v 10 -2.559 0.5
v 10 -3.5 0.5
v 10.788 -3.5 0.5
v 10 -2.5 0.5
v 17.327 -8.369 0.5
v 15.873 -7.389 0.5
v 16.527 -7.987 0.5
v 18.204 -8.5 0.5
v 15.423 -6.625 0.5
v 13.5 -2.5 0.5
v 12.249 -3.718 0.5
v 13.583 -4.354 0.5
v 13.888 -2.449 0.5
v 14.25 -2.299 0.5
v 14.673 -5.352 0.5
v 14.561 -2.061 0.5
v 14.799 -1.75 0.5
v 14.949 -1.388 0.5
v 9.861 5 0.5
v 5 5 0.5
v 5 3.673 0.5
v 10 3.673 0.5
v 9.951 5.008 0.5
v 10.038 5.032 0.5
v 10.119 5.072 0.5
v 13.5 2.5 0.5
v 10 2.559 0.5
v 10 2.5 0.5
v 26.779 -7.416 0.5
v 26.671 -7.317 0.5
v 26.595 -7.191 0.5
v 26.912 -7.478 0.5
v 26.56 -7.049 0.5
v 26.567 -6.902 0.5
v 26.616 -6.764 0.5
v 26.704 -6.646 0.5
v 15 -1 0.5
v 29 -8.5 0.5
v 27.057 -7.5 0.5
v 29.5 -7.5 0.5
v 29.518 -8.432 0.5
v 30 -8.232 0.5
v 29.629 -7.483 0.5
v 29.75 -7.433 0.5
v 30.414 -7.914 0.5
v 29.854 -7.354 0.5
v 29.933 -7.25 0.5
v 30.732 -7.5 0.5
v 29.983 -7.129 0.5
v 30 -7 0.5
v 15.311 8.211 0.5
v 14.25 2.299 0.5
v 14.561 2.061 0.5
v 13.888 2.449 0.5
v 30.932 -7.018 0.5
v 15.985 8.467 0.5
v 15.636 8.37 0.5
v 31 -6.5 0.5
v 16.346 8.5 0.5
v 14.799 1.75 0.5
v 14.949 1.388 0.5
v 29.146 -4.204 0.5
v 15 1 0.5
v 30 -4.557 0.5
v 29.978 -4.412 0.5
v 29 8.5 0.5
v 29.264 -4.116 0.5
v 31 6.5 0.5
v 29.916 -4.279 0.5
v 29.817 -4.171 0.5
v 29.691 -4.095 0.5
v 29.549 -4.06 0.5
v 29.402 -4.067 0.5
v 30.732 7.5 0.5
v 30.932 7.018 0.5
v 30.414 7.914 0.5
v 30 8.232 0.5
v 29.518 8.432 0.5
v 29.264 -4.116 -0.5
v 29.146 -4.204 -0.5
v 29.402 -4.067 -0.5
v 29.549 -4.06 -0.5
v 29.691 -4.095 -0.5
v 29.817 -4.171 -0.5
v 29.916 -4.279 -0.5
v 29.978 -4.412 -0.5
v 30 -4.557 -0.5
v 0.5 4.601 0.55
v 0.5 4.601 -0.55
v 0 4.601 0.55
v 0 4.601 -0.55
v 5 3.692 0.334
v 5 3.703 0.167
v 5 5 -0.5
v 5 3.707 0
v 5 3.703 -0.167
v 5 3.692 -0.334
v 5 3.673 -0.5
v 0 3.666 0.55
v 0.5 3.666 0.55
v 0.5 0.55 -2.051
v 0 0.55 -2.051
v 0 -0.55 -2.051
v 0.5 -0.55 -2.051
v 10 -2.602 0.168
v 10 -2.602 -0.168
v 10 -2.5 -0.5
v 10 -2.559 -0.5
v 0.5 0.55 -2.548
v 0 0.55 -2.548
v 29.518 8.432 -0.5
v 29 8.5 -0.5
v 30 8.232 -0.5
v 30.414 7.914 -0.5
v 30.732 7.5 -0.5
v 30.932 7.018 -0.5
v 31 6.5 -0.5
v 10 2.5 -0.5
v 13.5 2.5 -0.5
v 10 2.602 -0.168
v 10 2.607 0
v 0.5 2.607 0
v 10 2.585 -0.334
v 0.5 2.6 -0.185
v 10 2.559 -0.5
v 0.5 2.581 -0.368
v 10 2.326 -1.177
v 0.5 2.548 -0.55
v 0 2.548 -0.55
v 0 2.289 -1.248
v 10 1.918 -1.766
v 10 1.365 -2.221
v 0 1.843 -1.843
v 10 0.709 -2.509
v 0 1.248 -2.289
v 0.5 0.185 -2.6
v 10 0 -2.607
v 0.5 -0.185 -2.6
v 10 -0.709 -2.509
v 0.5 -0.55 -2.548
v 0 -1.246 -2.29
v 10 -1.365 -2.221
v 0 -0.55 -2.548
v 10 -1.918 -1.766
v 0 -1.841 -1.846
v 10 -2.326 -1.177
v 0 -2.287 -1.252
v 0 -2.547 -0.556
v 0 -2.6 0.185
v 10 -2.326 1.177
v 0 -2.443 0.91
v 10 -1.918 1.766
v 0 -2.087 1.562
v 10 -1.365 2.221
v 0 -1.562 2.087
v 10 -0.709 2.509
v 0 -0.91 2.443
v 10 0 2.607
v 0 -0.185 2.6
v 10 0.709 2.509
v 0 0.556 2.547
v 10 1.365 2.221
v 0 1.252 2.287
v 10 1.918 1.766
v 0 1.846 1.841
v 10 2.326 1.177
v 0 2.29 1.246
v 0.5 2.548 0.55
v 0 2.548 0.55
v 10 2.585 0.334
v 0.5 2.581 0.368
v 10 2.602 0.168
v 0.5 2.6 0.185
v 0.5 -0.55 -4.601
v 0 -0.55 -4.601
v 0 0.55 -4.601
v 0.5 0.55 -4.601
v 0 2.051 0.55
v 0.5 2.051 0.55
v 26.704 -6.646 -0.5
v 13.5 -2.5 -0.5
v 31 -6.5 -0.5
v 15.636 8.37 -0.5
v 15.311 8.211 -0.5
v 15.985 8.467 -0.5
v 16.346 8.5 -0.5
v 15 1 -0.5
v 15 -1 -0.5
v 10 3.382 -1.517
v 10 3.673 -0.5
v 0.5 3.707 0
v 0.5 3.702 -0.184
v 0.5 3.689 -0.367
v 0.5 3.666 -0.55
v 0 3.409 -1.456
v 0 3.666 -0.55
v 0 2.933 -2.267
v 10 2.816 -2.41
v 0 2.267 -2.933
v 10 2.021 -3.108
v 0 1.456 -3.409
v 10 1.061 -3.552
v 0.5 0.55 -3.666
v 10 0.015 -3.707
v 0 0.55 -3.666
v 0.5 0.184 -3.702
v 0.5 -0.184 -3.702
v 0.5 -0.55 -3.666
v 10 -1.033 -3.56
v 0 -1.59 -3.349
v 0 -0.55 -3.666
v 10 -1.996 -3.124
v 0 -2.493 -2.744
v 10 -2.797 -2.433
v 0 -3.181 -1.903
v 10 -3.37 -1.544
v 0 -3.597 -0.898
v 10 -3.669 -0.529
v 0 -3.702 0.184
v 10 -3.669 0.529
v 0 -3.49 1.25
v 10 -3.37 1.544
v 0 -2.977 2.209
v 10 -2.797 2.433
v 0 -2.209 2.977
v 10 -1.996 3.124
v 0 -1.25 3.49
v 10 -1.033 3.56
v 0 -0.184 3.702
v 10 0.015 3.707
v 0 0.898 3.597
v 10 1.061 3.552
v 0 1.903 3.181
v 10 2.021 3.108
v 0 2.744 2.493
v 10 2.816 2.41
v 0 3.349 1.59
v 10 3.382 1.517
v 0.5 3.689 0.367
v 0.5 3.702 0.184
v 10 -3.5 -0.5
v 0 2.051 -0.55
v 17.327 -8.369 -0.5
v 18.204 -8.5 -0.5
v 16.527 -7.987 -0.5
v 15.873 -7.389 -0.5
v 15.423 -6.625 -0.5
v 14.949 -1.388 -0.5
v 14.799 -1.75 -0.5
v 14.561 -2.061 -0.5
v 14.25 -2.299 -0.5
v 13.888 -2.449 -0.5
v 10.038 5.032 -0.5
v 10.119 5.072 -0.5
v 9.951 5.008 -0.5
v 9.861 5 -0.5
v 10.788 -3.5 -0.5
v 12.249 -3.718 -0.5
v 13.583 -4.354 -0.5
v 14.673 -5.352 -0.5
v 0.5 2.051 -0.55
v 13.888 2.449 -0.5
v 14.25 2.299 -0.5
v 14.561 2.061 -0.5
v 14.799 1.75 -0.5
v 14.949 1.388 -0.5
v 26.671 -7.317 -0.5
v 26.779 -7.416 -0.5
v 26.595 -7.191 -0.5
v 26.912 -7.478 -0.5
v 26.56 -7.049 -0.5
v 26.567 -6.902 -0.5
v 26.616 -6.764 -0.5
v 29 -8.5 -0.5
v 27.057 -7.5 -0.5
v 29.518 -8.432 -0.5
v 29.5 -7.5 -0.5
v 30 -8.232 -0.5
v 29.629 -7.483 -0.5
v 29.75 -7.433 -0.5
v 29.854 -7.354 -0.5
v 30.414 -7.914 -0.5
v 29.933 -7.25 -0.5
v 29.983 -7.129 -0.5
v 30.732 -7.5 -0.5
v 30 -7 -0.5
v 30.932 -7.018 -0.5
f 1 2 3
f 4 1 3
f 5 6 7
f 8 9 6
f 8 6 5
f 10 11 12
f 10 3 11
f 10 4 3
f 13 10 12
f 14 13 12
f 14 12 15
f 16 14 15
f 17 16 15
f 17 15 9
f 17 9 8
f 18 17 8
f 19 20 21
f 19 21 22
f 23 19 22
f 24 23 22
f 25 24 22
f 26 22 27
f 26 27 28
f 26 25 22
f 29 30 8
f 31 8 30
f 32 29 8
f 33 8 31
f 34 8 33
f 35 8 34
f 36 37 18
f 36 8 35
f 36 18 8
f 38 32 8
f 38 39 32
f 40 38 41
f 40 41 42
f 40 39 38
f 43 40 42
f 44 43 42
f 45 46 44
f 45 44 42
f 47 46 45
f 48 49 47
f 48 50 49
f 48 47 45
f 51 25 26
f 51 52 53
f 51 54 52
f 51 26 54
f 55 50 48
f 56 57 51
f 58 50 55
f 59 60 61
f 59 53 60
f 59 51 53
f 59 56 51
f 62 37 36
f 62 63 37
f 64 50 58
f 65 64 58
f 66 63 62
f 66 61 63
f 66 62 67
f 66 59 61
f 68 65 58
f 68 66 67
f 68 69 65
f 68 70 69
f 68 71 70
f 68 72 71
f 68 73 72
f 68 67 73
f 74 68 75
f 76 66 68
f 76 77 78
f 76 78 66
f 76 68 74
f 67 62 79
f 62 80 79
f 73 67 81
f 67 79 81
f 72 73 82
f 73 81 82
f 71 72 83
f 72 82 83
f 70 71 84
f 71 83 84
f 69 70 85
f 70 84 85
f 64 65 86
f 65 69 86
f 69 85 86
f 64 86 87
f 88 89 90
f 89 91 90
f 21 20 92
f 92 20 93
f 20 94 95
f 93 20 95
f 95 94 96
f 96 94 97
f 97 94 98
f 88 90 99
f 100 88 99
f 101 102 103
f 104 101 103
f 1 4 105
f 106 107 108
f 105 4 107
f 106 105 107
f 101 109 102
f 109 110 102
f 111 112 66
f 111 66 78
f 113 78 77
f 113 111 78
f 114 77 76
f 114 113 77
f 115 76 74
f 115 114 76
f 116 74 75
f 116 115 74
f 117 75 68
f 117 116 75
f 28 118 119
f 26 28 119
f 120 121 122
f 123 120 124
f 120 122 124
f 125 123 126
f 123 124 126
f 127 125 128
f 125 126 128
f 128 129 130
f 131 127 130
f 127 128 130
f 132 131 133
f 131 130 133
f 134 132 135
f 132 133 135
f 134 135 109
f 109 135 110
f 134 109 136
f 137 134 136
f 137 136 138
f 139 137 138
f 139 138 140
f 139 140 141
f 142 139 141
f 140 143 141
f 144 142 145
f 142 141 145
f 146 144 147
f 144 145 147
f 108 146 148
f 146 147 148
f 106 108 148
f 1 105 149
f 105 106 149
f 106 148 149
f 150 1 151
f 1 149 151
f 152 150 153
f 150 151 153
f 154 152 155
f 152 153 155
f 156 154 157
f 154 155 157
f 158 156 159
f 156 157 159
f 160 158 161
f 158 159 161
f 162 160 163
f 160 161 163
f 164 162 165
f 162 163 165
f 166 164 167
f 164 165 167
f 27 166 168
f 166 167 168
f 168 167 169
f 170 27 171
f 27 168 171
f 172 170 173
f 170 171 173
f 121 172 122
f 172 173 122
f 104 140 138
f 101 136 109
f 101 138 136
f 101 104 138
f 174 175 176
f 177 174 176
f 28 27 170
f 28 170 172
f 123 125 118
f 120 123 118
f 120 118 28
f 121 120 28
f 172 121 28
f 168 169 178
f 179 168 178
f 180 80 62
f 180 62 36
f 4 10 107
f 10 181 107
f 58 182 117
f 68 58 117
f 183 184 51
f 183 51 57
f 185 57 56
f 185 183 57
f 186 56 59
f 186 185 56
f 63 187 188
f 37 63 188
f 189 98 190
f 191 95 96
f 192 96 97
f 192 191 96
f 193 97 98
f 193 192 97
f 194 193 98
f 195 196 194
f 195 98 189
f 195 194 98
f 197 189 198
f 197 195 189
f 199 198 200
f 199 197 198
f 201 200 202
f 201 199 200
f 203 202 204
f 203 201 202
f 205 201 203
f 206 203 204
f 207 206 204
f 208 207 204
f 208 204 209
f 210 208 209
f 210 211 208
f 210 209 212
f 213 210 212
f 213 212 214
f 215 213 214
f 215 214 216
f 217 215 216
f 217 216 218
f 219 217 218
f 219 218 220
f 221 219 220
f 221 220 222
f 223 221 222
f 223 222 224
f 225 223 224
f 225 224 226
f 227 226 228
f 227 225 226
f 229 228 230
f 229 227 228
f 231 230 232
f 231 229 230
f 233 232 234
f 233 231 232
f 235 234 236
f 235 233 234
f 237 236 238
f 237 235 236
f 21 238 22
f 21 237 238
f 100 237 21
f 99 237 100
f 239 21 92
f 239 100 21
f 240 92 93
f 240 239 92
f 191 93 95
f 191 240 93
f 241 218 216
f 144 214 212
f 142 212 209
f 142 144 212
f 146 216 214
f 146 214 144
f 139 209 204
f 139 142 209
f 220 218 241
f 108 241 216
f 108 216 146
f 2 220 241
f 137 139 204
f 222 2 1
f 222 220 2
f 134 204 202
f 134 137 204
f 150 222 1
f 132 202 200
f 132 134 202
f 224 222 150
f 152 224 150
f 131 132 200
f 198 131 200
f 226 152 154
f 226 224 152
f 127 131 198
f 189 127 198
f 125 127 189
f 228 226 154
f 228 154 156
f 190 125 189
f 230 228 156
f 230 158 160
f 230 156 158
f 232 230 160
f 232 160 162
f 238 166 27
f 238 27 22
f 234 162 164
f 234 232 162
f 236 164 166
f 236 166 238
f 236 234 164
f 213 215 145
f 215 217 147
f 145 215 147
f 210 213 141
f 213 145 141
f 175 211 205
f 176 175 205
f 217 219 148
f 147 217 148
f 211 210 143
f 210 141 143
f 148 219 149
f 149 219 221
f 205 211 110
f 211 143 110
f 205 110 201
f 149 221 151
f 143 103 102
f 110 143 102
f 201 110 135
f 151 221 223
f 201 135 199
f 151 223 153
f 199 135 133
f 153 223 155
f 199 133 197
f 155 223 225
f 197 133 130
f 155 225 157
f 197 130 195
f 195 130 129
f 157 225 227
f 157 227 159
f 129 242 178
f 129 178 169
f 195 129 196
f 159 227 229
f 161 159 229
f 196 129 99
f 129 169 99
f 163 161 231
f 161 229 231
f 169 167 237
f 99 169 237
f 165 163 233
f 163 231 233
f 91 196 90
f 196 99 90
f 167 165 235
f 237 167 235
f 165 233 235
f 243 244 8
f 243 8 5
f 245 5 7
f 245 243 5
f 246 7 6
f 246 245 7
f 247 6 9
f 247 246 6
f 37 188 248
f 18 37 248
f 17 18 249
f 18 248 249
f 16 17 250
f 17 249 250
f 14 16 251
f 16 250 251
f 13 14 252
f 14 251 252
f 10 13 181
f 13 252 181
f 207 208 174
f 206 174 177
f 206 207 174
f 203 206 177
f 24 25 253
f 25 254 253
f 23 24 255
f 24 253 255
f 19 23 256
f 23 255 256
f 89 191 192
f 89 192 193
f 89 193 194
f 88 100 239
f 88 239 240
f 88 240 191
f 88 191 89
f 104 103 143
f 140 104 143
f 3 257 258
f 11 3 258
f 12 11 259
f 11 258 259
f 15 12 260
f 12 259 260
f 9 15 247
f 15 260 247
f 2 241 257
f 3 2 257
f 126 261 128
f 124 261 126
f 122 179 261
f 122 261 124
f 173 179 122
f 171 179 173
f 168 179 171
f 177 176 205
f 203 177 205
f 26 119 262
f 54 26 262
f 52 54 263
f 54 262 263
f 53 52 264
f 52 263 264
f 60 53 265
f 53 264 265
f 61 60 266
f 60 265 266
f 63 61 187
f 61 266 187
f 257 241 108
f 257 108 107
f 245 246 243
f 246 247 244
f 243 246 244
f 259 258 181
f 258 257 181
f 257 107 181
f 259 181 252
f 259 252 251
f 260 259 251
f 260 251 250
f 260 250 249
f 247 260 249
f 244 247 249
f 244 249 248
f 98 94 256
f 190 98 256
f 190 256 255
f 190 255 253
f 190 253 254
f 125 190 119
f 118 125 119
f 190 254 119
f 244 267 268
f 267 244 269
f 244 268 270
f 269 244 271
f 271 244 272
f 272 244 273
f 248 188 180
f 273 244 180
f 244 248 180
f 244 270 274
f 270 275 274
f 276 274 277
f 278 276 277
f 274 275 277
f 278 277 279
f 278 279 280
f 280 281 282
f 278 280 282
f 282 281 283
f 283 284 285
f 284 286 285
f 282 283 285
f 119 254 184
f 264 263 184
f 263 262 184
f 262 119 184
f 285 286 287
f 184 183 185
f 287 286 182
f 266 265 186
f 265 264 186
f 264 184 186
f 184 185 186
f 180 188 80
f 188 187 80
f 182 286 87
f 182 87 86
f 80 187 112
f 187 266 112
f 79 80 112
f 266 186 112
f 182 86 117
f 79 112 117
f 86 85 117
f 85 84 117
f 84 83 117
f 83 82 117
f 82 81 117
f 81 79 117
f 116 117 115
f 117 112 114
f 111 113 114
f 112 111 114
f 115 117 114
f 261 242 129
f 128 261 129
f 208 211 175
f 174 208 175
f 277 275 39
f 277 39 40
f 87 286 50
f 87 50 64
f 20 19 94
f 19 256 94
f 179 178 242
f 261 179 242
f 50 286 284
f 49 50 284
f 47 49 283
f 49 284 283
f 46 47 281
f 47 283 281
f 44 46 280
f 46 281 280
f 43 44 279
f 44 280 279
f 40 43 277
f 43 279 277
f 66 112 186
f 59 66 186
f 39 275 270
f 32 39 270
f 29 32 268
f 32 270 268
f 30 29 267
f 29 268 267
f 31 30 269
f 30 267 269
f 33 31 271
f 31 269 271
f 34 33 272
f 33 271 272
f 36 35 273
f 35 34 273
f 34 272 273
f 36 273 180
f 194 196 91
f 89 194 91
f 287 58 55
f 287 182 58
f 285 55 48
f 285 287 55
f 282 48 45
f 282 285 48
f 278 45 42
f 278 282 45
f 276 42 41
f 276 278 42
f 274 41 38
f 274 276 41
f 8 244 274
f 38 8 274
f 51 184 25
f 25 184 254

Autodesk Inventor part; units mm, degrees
sketch "Sketch_1" plane through (0, 0, 0) normal (1, 0, 0) x (0, 1, 0)
  circle A0 centre (0, 0) radius 3.707
  circle A1 centre (0, 0) radius 2.607
extrude "Extrusion1" add sketch "Sketch_1" along normal blind 10
sketch "Sketch_2" plane through (0, 0, 0) normal (1, 0, 0) x (0, 1, 0)
  line L0 (2.0509, 0.55) -> (2.0509, -0.55)
  line L1 (2.0509, -0.55) -> (4.6009, -0.55)
  line L2 (4.6009, -0.55) -> (4.6009, 0.55)
  line L3 (4.6009, 0.55) -> (2.0509, 0.55)
extrude "Extrusion2" add sketch "Sketch_2" along normal blind 0.5
sketch "Sketch_3" plane through (0, 0, 0) normal (1, 0, 0) x (0, 1, 0)
  line L0 (0.55, -2.0509) -> (-0.55, -2.0509)
  line L1 (-0.55, -2.0509) -> (-0.55, -4.6009)
  line L2 (-0.55, -4.6009) -> (0.55, -4.6009)
  line L3 (0.55, -4.6009) -> (0.55, -2.0509)
extrude "Extrusion3" add sketch "Sketch_3" along normal blind 0.5
sketch "Sketch_4" plane through (0, 0, 0) normal (0, 0, 1) x (1, 0, 0)
  line L0 (5, 5) -> (5, 3.5)
  line L1 (5, 3.5) -> (10, 3.5)
  line L2 (10, 3.5) -> (10, 2.5)
  line L3 (10, 2.5) -> (13.5, 2.5)
  arc A0 (15, 1) -> (13.5, 2.5) centre (13.5, 1) ccw
  line L4 (15, 1) -> (15, -1)
  arc A1 (13.5, -2.5) -> (15, -1) centre (13.5, -1) ccw
  line L5 (13.5, -2.5) -> (10, -2.5)
  line L6 (10, -2.5) -> (10, -3.5)
  line L7 (10, -3.5) -> (10.7881, -3.5)
  arc A2 (15.4232, -6.625) -> (10.7881, -3.5) centre (10.7881, -8.5) ccw
  arc A3 (15.4232, -6.625) -> (18.2043, -8.5) centre (18.2043, -5.5) ccw
  line L8 (18.2043, -8.5) -> (29, -8.5)
  arc A4 (29, -8.5) -> (31, -6.5) centre (29, -6.5) ccw
  line L9 (31, -6.5) -> (31, 6.5)
  arc A5 (31, 6.5) -> (29, 8.5) centre (29, 6.5) ccw
  line L10 (29, 8.5) -> (16.3458, 8.5)
  arc A6 (16.3458, 8.5) -> (15.3109, 8.2114) centre (16.3458, 6.5) ccw
  line L11 (15.3109, 8.2114) -> (10.1193, 5.0721)
  arc A7 (9.8606, 5) -> (10.1193, 5.0721) centre (9.8606, 5.5) ccw
  line L12 (9.8606, 5) -> (5, 5)
  arc A8 (26.7036, -6.6464) -> (27.0571, -7.5) centre (27.0571, -7) ccw
  line L13 (27.0571, -7.5) -> (29.5, -7.5)
  arc A9 (29.5, -7.5) -> (30, -7) centre (29.5, -7) ccw
  line L14 (30, -7) -> (30, -4.5571)
  arc A10 (30, -4.5571) -> (29.1464, -4.2036) centre (29.5, -4.5571) ccw
  line L15 (29.1464, -4.2036) -> (26.7036, -6.6464)
extrude "Extrusion4" add sketch "Sketch_4" along normal mid plane 1
ref_plane "k_to_1_XY" through (0, 0, 0) normal (1, 0, 0) x (0, 0, -1)
ref_plane "k_to_1_YZ" through (0, 0, 0) normal (0, 0, -1) x (0, 1, 0)
ref_plane "k_to_1_ZX" through (0, 0, 0) normal (0, 1, 0) x (1, 0, 0)
ref_plane "3_TO_K_XY" through (27, -6.5, 0) normal (0, 0, 1) x (1, 0, 0)
ref_plane "3_TO_K_YZ" through (27, -6.5, 0) normal (1, 0, 0) x (0, 1, 0)
ref_plane "3_TO_K_ZX" through (27, -6.5, 0) normal (0, 1, 0) x (0, 0, 1)
ref_plane "K1_TO_3_XY" through (29, -3, 0) normal (1, 0, 0) x (0, 0, -1)
ref_plane "K1_TO_3_YZ" through (29, -3, 0) normal (0, 0, -1) x (0, 1, 0)
ref_plane "K1_TO_3_ZX" through (29, -3, 0) normal (0, 1, 0) x (1, 0, 0)
properties part number "LOCNL2_k"
